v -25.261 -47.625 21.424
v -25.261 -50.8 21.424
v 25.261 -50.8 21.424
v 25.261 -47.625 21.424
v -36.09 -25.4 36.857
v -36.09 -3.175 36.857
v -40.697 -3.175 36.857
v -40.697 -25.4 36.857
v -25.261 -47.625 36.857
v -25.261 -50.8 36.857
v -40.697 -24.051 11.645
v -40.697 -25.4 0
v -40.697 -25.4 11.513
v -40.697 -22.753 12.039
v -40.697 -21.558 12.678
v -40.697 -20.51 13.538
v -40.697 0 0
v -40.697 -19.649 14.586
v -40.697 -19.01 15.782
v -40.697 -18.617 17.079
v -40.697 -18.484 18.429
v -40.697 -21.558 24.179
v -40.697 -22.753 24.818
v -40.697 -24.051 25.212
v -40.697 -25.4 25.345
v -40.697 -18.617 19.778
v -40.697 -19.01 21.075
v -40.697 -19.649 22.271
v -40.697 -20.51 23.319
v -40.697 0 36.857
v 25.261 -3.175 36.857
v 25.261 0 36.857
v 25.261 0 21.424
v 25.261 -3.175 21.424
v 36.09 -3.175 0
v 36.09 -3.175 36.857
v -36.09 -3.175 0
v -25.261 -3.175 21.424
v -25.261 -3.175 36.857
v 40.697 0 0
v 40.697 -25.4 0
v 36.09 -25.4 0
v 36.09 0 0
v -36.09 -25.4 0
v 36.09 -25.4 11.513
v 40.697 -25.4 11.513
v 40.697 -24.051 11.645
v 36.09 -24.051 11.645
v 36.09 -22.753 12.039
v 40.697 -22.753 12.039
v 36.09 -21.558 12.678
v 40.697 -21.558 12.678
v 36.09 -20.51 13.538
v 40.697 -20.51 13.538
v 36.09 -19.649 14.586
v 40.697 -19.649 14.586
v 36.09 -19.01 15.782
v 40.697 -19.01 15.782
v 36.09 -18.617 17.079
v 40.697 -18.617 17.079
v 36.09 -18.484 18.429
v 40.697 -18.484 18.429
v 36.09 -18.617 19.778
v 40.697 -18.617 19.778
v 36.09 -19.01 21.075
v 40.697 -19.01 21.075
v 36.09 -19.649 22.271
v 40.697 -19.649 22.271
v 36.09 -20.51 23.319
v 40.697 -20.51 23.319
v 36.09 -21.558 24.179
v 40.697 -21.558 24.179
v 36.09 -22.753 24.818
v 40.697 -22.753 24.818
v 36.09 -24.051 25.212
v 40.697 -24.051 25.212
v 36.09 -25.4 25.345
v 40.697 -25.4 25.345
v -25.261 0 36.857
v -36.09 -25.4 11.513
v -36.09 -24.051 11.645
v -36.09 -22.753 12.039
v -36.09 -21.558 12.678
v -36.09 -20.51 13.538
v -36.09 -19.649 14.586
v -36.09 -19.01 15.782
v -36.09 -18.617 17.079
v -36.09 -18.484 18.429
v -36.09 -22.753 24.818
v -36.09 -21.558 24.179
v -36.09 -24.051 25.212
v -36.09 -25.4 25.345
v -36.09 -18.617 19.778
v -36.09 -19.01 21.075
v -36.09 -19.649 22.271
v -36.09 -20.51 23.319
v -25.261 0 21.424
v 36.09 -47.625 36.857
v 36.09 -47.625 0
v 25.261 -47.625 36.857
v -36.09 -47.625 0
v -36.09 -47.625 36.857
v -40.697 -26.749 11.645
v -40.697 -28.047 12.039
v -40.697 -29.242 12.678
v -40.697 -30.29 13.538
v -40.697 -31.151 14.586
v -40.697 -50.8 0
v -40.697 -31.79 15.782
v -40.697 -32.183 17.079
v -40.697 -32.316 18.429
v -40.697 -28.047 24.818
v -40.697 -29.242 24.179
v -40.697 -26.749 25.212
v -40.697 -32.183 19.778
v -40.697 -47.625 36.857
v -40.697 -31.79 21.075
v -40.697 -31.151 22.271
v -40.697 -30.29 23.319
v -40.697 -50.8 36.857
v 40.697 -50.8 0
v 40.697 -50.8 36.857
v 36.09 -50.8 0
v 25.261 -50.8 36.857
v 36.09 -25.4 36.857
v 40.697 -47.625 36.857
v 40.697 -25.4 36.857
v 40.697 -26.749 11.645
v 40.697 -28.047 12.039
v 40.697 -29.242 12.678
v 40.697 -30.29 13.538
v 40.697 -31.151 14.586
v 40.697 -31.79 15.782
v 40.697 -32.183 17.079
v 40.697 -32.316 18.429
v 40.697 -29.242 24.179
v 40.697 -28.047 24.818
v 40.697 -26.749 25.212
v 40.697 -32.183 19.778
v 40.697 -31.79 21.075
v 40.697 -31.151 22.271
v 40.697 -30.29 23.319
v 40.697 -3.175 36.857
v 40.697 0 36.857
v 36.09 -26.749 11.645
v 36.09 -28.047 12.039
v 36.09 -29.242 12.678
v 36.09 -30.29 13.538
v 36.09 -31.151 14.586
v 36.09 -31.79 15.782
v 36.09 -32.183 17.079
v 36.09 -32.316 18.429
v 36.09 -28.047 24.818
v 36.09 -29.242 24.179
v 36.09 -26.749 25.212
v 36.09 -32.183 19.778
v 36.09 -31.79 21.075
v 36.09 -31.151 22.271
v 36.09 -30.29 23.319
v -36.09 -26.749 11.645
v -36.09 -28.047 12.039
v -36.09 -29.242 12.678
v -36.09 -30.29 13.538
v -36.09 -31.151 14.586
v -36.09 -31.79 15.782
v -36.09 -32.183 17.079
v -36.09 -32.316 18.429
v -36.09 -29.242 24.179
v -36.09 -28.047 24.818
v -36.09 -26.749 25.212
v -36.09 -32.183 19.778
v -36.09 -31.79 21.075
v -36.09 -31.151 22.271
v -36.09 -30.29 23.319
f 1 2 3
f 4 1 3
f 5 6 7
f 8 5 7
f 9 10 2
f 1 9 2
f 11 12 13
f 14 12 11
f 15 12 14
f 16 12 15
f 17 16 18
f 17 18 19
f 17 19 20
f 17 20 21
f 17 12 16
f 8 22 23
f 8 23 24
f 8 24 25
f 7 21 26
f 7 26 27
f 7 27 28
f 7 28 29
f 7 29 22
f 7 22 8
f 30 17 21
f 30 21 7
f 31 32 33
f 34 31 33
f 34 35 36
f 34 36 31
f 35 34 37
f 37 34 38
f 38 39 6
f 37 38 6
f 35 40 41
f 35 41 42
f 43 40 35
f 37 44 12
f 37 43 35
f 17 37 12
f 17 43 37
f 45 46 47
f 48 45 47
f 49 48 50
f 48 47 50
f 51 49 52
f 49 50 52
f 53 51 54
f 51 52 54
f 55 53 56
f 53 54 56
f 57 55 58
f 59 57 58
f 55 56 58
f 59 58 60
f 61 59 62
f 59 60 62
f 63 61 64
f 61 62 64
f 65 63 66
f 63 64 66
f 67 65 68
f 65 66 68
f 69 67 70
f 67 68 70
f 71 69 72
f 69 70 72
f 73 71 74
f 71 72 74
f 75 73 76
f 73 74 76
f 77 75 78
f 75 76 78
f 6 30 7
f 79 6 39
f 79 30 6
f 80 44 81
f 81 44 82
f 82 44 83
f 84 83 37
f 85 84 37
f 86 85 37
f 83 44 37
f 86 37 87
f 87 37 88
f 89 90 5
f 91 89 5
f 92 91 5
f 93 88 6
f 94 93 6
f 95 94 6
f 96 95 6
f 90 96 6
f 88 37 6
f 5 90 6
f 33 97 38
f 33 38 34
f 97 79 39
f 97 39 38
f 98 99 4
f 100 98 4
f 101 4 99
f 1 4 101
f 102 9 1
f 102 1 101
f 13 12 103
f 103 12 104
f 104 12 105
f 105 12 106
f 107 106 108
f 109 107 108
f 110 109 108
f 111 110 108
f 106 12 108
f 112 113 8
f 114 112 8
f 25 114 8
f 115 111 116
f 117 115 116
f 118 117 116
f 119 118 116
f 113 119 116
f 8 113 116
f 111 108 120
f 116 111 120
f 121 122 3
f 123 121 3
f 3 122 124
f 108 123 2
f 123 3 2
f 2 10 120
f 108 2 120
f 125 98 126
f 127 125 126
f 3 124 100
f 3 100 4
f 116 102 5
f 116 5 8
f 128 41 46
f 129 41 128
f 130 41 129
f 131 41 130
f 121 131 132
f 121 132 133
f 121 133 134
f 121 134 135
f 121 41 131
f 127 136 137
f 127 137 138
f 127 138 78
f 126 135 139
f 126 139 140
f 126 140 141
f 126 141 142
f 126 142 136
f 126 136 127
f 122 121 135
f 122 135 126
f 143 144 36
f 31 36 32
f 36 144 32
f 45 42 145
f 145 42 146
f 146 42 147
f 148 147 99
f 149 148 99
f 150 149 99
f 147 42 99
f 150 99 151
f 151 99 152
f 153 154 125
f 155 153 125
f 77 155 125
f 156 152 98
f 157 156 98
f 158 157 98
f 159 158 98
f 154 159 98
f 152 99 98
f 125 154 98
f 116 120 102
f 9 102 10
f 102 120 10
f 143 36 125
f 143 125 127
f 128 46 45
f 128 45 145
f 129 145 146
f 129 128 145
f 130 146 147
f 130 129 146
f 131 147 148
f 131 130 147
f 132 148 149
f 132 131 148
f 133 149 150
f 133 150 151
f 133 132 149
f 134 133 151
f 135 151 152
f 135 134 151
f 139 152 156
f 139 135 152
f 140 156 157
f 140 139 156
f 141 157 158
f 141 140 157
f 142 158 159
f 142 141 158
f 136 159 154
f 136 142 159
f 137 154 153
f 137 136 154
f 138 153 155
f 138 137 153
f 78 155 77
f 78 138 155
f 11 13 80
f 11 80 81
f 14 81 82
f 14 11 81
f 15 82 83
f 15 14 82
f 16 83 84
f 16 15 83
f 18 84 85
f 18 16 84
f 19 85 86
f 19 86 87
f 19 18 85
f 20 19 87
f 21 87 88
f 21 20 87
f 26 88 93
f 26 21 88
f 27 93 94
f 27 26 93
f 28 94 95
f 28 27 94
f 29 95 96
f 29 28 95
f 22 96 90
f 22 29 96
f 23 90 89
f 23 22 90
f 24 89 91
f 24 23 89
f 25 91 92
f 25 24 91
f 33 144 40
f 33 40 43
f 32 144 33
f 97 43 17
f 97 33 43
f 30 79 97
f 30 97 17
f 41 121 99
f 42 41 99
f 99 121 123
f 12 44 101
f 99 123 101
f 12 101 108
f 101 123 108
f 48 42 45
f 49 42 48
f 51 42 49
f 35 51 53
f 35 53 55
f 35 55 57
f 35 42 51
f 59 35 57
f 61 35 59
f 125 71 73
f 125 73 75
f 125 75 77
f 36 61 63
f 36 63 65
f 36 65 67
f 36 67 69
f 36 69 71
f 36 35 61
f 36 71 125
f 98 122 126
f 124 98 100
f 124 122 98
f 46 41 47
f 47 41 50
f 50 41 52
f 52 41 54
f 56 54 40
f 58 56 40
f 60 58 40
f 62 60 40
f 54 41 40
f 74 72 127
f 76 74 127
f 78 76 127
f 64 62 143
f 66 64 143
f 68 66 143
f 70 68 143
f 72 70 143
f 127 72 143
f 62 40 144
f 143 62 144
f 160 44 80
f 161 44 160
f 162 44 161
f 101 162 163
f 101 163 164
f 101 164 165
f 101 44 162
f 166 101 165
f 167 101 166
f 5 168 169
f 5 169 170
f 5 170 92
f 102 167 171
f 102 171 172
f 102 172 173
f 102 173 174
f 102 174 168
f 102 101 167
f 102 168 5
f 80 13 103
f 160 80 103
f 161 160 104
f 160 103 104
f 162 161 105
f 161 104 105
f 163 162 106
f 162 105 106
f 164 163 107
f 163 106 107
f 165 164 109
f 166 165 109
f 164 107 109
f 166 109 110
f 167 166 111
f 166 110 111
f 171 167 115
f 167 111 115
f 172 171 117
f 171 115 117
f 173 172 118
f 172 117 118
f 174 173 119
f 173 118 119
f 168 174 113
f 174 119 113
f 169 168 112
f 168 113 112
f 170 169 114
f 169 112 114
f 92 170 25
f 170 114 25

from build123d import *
from build123d import SkipClean  # not in build123d's __all__

# Parameters (mm, degrees)
F0_W     = 4.6070814133
F0_H     = 36.8574000895
F1_DEPTH = 3.175
F2_DEPTH = 25.4
F4_DEPTH = 6.35


# Not quite as in the source:
# - a feature names something its author has since deleted; it is built from what else it names


with BuildPart() as f1:
    # F0 (on Front) → F1 (new body)
    with BuildSketch(Plane.XZ):
        with Locations((38.3936055005, 18.4287000448)):
            Rectangle(F0_W, F0_H)
        Polygon((0, 21.4239992201), (0, 0), (36.0900647938, 0), (36.0900647938, 36.8574000895), (25.2613946795, 36.8574000895), (25.2613946795, 21.4239992201), align=None)
        Polygon((0, 21.4239992201), (0, 0), (36.0900647938, 0), (36.0900647938, 36.8574000895), (25.2613946795, 36.8574000895), (25.2613946795, 21.4239992201), align=None)
    extrude(amount=F1_DEPTH)

    # F0 (on Front) → F2 (join)
    with BuildSketch(Plane.XZ):
        with Locations((38.3936055005, 18.4287000448)):
            Rectangle(F0_W, F0_H)
    extrude(amount=F2_DEPTH)

    # F3 (on face) → F4 (cut)
    with BuildSketch(Plane.YZ.offset(40.6971462071)):
        with BuildLine():
            Line((-25.4, 25.344834663), (-25.4, 11.5125654265))
            ThreePointArc((-25.4, 11.5125654265), (-18.4838653818, 18.4287000448), (-25.4, 25.344834663))
        make_face()
    extrude(amount=-F4_DEPTH, mode=Mode.SUBTRACT)

    # F5: F1 across plane


with BuildPart() as f1_1:
    add(f1.part, clean=False)
    add(f1.part.mirror(Plane.YZ), clean=False)

    # F6: F1 across face


with BuildPart() as f1_2:
    add(f1_1.part, clean=False)
    with SkipClean():  # cleaning this boolean's faces spoils the solid; the shape is the same uncleaned
        add(f1_1.part.mirror(Plane(origin=(38.3936055005, -25.4, 5.7562827133), x_dir=(1, 0, 0), z_dir=(0, -1, 0))), clean=False)


solid = f1_2.part
